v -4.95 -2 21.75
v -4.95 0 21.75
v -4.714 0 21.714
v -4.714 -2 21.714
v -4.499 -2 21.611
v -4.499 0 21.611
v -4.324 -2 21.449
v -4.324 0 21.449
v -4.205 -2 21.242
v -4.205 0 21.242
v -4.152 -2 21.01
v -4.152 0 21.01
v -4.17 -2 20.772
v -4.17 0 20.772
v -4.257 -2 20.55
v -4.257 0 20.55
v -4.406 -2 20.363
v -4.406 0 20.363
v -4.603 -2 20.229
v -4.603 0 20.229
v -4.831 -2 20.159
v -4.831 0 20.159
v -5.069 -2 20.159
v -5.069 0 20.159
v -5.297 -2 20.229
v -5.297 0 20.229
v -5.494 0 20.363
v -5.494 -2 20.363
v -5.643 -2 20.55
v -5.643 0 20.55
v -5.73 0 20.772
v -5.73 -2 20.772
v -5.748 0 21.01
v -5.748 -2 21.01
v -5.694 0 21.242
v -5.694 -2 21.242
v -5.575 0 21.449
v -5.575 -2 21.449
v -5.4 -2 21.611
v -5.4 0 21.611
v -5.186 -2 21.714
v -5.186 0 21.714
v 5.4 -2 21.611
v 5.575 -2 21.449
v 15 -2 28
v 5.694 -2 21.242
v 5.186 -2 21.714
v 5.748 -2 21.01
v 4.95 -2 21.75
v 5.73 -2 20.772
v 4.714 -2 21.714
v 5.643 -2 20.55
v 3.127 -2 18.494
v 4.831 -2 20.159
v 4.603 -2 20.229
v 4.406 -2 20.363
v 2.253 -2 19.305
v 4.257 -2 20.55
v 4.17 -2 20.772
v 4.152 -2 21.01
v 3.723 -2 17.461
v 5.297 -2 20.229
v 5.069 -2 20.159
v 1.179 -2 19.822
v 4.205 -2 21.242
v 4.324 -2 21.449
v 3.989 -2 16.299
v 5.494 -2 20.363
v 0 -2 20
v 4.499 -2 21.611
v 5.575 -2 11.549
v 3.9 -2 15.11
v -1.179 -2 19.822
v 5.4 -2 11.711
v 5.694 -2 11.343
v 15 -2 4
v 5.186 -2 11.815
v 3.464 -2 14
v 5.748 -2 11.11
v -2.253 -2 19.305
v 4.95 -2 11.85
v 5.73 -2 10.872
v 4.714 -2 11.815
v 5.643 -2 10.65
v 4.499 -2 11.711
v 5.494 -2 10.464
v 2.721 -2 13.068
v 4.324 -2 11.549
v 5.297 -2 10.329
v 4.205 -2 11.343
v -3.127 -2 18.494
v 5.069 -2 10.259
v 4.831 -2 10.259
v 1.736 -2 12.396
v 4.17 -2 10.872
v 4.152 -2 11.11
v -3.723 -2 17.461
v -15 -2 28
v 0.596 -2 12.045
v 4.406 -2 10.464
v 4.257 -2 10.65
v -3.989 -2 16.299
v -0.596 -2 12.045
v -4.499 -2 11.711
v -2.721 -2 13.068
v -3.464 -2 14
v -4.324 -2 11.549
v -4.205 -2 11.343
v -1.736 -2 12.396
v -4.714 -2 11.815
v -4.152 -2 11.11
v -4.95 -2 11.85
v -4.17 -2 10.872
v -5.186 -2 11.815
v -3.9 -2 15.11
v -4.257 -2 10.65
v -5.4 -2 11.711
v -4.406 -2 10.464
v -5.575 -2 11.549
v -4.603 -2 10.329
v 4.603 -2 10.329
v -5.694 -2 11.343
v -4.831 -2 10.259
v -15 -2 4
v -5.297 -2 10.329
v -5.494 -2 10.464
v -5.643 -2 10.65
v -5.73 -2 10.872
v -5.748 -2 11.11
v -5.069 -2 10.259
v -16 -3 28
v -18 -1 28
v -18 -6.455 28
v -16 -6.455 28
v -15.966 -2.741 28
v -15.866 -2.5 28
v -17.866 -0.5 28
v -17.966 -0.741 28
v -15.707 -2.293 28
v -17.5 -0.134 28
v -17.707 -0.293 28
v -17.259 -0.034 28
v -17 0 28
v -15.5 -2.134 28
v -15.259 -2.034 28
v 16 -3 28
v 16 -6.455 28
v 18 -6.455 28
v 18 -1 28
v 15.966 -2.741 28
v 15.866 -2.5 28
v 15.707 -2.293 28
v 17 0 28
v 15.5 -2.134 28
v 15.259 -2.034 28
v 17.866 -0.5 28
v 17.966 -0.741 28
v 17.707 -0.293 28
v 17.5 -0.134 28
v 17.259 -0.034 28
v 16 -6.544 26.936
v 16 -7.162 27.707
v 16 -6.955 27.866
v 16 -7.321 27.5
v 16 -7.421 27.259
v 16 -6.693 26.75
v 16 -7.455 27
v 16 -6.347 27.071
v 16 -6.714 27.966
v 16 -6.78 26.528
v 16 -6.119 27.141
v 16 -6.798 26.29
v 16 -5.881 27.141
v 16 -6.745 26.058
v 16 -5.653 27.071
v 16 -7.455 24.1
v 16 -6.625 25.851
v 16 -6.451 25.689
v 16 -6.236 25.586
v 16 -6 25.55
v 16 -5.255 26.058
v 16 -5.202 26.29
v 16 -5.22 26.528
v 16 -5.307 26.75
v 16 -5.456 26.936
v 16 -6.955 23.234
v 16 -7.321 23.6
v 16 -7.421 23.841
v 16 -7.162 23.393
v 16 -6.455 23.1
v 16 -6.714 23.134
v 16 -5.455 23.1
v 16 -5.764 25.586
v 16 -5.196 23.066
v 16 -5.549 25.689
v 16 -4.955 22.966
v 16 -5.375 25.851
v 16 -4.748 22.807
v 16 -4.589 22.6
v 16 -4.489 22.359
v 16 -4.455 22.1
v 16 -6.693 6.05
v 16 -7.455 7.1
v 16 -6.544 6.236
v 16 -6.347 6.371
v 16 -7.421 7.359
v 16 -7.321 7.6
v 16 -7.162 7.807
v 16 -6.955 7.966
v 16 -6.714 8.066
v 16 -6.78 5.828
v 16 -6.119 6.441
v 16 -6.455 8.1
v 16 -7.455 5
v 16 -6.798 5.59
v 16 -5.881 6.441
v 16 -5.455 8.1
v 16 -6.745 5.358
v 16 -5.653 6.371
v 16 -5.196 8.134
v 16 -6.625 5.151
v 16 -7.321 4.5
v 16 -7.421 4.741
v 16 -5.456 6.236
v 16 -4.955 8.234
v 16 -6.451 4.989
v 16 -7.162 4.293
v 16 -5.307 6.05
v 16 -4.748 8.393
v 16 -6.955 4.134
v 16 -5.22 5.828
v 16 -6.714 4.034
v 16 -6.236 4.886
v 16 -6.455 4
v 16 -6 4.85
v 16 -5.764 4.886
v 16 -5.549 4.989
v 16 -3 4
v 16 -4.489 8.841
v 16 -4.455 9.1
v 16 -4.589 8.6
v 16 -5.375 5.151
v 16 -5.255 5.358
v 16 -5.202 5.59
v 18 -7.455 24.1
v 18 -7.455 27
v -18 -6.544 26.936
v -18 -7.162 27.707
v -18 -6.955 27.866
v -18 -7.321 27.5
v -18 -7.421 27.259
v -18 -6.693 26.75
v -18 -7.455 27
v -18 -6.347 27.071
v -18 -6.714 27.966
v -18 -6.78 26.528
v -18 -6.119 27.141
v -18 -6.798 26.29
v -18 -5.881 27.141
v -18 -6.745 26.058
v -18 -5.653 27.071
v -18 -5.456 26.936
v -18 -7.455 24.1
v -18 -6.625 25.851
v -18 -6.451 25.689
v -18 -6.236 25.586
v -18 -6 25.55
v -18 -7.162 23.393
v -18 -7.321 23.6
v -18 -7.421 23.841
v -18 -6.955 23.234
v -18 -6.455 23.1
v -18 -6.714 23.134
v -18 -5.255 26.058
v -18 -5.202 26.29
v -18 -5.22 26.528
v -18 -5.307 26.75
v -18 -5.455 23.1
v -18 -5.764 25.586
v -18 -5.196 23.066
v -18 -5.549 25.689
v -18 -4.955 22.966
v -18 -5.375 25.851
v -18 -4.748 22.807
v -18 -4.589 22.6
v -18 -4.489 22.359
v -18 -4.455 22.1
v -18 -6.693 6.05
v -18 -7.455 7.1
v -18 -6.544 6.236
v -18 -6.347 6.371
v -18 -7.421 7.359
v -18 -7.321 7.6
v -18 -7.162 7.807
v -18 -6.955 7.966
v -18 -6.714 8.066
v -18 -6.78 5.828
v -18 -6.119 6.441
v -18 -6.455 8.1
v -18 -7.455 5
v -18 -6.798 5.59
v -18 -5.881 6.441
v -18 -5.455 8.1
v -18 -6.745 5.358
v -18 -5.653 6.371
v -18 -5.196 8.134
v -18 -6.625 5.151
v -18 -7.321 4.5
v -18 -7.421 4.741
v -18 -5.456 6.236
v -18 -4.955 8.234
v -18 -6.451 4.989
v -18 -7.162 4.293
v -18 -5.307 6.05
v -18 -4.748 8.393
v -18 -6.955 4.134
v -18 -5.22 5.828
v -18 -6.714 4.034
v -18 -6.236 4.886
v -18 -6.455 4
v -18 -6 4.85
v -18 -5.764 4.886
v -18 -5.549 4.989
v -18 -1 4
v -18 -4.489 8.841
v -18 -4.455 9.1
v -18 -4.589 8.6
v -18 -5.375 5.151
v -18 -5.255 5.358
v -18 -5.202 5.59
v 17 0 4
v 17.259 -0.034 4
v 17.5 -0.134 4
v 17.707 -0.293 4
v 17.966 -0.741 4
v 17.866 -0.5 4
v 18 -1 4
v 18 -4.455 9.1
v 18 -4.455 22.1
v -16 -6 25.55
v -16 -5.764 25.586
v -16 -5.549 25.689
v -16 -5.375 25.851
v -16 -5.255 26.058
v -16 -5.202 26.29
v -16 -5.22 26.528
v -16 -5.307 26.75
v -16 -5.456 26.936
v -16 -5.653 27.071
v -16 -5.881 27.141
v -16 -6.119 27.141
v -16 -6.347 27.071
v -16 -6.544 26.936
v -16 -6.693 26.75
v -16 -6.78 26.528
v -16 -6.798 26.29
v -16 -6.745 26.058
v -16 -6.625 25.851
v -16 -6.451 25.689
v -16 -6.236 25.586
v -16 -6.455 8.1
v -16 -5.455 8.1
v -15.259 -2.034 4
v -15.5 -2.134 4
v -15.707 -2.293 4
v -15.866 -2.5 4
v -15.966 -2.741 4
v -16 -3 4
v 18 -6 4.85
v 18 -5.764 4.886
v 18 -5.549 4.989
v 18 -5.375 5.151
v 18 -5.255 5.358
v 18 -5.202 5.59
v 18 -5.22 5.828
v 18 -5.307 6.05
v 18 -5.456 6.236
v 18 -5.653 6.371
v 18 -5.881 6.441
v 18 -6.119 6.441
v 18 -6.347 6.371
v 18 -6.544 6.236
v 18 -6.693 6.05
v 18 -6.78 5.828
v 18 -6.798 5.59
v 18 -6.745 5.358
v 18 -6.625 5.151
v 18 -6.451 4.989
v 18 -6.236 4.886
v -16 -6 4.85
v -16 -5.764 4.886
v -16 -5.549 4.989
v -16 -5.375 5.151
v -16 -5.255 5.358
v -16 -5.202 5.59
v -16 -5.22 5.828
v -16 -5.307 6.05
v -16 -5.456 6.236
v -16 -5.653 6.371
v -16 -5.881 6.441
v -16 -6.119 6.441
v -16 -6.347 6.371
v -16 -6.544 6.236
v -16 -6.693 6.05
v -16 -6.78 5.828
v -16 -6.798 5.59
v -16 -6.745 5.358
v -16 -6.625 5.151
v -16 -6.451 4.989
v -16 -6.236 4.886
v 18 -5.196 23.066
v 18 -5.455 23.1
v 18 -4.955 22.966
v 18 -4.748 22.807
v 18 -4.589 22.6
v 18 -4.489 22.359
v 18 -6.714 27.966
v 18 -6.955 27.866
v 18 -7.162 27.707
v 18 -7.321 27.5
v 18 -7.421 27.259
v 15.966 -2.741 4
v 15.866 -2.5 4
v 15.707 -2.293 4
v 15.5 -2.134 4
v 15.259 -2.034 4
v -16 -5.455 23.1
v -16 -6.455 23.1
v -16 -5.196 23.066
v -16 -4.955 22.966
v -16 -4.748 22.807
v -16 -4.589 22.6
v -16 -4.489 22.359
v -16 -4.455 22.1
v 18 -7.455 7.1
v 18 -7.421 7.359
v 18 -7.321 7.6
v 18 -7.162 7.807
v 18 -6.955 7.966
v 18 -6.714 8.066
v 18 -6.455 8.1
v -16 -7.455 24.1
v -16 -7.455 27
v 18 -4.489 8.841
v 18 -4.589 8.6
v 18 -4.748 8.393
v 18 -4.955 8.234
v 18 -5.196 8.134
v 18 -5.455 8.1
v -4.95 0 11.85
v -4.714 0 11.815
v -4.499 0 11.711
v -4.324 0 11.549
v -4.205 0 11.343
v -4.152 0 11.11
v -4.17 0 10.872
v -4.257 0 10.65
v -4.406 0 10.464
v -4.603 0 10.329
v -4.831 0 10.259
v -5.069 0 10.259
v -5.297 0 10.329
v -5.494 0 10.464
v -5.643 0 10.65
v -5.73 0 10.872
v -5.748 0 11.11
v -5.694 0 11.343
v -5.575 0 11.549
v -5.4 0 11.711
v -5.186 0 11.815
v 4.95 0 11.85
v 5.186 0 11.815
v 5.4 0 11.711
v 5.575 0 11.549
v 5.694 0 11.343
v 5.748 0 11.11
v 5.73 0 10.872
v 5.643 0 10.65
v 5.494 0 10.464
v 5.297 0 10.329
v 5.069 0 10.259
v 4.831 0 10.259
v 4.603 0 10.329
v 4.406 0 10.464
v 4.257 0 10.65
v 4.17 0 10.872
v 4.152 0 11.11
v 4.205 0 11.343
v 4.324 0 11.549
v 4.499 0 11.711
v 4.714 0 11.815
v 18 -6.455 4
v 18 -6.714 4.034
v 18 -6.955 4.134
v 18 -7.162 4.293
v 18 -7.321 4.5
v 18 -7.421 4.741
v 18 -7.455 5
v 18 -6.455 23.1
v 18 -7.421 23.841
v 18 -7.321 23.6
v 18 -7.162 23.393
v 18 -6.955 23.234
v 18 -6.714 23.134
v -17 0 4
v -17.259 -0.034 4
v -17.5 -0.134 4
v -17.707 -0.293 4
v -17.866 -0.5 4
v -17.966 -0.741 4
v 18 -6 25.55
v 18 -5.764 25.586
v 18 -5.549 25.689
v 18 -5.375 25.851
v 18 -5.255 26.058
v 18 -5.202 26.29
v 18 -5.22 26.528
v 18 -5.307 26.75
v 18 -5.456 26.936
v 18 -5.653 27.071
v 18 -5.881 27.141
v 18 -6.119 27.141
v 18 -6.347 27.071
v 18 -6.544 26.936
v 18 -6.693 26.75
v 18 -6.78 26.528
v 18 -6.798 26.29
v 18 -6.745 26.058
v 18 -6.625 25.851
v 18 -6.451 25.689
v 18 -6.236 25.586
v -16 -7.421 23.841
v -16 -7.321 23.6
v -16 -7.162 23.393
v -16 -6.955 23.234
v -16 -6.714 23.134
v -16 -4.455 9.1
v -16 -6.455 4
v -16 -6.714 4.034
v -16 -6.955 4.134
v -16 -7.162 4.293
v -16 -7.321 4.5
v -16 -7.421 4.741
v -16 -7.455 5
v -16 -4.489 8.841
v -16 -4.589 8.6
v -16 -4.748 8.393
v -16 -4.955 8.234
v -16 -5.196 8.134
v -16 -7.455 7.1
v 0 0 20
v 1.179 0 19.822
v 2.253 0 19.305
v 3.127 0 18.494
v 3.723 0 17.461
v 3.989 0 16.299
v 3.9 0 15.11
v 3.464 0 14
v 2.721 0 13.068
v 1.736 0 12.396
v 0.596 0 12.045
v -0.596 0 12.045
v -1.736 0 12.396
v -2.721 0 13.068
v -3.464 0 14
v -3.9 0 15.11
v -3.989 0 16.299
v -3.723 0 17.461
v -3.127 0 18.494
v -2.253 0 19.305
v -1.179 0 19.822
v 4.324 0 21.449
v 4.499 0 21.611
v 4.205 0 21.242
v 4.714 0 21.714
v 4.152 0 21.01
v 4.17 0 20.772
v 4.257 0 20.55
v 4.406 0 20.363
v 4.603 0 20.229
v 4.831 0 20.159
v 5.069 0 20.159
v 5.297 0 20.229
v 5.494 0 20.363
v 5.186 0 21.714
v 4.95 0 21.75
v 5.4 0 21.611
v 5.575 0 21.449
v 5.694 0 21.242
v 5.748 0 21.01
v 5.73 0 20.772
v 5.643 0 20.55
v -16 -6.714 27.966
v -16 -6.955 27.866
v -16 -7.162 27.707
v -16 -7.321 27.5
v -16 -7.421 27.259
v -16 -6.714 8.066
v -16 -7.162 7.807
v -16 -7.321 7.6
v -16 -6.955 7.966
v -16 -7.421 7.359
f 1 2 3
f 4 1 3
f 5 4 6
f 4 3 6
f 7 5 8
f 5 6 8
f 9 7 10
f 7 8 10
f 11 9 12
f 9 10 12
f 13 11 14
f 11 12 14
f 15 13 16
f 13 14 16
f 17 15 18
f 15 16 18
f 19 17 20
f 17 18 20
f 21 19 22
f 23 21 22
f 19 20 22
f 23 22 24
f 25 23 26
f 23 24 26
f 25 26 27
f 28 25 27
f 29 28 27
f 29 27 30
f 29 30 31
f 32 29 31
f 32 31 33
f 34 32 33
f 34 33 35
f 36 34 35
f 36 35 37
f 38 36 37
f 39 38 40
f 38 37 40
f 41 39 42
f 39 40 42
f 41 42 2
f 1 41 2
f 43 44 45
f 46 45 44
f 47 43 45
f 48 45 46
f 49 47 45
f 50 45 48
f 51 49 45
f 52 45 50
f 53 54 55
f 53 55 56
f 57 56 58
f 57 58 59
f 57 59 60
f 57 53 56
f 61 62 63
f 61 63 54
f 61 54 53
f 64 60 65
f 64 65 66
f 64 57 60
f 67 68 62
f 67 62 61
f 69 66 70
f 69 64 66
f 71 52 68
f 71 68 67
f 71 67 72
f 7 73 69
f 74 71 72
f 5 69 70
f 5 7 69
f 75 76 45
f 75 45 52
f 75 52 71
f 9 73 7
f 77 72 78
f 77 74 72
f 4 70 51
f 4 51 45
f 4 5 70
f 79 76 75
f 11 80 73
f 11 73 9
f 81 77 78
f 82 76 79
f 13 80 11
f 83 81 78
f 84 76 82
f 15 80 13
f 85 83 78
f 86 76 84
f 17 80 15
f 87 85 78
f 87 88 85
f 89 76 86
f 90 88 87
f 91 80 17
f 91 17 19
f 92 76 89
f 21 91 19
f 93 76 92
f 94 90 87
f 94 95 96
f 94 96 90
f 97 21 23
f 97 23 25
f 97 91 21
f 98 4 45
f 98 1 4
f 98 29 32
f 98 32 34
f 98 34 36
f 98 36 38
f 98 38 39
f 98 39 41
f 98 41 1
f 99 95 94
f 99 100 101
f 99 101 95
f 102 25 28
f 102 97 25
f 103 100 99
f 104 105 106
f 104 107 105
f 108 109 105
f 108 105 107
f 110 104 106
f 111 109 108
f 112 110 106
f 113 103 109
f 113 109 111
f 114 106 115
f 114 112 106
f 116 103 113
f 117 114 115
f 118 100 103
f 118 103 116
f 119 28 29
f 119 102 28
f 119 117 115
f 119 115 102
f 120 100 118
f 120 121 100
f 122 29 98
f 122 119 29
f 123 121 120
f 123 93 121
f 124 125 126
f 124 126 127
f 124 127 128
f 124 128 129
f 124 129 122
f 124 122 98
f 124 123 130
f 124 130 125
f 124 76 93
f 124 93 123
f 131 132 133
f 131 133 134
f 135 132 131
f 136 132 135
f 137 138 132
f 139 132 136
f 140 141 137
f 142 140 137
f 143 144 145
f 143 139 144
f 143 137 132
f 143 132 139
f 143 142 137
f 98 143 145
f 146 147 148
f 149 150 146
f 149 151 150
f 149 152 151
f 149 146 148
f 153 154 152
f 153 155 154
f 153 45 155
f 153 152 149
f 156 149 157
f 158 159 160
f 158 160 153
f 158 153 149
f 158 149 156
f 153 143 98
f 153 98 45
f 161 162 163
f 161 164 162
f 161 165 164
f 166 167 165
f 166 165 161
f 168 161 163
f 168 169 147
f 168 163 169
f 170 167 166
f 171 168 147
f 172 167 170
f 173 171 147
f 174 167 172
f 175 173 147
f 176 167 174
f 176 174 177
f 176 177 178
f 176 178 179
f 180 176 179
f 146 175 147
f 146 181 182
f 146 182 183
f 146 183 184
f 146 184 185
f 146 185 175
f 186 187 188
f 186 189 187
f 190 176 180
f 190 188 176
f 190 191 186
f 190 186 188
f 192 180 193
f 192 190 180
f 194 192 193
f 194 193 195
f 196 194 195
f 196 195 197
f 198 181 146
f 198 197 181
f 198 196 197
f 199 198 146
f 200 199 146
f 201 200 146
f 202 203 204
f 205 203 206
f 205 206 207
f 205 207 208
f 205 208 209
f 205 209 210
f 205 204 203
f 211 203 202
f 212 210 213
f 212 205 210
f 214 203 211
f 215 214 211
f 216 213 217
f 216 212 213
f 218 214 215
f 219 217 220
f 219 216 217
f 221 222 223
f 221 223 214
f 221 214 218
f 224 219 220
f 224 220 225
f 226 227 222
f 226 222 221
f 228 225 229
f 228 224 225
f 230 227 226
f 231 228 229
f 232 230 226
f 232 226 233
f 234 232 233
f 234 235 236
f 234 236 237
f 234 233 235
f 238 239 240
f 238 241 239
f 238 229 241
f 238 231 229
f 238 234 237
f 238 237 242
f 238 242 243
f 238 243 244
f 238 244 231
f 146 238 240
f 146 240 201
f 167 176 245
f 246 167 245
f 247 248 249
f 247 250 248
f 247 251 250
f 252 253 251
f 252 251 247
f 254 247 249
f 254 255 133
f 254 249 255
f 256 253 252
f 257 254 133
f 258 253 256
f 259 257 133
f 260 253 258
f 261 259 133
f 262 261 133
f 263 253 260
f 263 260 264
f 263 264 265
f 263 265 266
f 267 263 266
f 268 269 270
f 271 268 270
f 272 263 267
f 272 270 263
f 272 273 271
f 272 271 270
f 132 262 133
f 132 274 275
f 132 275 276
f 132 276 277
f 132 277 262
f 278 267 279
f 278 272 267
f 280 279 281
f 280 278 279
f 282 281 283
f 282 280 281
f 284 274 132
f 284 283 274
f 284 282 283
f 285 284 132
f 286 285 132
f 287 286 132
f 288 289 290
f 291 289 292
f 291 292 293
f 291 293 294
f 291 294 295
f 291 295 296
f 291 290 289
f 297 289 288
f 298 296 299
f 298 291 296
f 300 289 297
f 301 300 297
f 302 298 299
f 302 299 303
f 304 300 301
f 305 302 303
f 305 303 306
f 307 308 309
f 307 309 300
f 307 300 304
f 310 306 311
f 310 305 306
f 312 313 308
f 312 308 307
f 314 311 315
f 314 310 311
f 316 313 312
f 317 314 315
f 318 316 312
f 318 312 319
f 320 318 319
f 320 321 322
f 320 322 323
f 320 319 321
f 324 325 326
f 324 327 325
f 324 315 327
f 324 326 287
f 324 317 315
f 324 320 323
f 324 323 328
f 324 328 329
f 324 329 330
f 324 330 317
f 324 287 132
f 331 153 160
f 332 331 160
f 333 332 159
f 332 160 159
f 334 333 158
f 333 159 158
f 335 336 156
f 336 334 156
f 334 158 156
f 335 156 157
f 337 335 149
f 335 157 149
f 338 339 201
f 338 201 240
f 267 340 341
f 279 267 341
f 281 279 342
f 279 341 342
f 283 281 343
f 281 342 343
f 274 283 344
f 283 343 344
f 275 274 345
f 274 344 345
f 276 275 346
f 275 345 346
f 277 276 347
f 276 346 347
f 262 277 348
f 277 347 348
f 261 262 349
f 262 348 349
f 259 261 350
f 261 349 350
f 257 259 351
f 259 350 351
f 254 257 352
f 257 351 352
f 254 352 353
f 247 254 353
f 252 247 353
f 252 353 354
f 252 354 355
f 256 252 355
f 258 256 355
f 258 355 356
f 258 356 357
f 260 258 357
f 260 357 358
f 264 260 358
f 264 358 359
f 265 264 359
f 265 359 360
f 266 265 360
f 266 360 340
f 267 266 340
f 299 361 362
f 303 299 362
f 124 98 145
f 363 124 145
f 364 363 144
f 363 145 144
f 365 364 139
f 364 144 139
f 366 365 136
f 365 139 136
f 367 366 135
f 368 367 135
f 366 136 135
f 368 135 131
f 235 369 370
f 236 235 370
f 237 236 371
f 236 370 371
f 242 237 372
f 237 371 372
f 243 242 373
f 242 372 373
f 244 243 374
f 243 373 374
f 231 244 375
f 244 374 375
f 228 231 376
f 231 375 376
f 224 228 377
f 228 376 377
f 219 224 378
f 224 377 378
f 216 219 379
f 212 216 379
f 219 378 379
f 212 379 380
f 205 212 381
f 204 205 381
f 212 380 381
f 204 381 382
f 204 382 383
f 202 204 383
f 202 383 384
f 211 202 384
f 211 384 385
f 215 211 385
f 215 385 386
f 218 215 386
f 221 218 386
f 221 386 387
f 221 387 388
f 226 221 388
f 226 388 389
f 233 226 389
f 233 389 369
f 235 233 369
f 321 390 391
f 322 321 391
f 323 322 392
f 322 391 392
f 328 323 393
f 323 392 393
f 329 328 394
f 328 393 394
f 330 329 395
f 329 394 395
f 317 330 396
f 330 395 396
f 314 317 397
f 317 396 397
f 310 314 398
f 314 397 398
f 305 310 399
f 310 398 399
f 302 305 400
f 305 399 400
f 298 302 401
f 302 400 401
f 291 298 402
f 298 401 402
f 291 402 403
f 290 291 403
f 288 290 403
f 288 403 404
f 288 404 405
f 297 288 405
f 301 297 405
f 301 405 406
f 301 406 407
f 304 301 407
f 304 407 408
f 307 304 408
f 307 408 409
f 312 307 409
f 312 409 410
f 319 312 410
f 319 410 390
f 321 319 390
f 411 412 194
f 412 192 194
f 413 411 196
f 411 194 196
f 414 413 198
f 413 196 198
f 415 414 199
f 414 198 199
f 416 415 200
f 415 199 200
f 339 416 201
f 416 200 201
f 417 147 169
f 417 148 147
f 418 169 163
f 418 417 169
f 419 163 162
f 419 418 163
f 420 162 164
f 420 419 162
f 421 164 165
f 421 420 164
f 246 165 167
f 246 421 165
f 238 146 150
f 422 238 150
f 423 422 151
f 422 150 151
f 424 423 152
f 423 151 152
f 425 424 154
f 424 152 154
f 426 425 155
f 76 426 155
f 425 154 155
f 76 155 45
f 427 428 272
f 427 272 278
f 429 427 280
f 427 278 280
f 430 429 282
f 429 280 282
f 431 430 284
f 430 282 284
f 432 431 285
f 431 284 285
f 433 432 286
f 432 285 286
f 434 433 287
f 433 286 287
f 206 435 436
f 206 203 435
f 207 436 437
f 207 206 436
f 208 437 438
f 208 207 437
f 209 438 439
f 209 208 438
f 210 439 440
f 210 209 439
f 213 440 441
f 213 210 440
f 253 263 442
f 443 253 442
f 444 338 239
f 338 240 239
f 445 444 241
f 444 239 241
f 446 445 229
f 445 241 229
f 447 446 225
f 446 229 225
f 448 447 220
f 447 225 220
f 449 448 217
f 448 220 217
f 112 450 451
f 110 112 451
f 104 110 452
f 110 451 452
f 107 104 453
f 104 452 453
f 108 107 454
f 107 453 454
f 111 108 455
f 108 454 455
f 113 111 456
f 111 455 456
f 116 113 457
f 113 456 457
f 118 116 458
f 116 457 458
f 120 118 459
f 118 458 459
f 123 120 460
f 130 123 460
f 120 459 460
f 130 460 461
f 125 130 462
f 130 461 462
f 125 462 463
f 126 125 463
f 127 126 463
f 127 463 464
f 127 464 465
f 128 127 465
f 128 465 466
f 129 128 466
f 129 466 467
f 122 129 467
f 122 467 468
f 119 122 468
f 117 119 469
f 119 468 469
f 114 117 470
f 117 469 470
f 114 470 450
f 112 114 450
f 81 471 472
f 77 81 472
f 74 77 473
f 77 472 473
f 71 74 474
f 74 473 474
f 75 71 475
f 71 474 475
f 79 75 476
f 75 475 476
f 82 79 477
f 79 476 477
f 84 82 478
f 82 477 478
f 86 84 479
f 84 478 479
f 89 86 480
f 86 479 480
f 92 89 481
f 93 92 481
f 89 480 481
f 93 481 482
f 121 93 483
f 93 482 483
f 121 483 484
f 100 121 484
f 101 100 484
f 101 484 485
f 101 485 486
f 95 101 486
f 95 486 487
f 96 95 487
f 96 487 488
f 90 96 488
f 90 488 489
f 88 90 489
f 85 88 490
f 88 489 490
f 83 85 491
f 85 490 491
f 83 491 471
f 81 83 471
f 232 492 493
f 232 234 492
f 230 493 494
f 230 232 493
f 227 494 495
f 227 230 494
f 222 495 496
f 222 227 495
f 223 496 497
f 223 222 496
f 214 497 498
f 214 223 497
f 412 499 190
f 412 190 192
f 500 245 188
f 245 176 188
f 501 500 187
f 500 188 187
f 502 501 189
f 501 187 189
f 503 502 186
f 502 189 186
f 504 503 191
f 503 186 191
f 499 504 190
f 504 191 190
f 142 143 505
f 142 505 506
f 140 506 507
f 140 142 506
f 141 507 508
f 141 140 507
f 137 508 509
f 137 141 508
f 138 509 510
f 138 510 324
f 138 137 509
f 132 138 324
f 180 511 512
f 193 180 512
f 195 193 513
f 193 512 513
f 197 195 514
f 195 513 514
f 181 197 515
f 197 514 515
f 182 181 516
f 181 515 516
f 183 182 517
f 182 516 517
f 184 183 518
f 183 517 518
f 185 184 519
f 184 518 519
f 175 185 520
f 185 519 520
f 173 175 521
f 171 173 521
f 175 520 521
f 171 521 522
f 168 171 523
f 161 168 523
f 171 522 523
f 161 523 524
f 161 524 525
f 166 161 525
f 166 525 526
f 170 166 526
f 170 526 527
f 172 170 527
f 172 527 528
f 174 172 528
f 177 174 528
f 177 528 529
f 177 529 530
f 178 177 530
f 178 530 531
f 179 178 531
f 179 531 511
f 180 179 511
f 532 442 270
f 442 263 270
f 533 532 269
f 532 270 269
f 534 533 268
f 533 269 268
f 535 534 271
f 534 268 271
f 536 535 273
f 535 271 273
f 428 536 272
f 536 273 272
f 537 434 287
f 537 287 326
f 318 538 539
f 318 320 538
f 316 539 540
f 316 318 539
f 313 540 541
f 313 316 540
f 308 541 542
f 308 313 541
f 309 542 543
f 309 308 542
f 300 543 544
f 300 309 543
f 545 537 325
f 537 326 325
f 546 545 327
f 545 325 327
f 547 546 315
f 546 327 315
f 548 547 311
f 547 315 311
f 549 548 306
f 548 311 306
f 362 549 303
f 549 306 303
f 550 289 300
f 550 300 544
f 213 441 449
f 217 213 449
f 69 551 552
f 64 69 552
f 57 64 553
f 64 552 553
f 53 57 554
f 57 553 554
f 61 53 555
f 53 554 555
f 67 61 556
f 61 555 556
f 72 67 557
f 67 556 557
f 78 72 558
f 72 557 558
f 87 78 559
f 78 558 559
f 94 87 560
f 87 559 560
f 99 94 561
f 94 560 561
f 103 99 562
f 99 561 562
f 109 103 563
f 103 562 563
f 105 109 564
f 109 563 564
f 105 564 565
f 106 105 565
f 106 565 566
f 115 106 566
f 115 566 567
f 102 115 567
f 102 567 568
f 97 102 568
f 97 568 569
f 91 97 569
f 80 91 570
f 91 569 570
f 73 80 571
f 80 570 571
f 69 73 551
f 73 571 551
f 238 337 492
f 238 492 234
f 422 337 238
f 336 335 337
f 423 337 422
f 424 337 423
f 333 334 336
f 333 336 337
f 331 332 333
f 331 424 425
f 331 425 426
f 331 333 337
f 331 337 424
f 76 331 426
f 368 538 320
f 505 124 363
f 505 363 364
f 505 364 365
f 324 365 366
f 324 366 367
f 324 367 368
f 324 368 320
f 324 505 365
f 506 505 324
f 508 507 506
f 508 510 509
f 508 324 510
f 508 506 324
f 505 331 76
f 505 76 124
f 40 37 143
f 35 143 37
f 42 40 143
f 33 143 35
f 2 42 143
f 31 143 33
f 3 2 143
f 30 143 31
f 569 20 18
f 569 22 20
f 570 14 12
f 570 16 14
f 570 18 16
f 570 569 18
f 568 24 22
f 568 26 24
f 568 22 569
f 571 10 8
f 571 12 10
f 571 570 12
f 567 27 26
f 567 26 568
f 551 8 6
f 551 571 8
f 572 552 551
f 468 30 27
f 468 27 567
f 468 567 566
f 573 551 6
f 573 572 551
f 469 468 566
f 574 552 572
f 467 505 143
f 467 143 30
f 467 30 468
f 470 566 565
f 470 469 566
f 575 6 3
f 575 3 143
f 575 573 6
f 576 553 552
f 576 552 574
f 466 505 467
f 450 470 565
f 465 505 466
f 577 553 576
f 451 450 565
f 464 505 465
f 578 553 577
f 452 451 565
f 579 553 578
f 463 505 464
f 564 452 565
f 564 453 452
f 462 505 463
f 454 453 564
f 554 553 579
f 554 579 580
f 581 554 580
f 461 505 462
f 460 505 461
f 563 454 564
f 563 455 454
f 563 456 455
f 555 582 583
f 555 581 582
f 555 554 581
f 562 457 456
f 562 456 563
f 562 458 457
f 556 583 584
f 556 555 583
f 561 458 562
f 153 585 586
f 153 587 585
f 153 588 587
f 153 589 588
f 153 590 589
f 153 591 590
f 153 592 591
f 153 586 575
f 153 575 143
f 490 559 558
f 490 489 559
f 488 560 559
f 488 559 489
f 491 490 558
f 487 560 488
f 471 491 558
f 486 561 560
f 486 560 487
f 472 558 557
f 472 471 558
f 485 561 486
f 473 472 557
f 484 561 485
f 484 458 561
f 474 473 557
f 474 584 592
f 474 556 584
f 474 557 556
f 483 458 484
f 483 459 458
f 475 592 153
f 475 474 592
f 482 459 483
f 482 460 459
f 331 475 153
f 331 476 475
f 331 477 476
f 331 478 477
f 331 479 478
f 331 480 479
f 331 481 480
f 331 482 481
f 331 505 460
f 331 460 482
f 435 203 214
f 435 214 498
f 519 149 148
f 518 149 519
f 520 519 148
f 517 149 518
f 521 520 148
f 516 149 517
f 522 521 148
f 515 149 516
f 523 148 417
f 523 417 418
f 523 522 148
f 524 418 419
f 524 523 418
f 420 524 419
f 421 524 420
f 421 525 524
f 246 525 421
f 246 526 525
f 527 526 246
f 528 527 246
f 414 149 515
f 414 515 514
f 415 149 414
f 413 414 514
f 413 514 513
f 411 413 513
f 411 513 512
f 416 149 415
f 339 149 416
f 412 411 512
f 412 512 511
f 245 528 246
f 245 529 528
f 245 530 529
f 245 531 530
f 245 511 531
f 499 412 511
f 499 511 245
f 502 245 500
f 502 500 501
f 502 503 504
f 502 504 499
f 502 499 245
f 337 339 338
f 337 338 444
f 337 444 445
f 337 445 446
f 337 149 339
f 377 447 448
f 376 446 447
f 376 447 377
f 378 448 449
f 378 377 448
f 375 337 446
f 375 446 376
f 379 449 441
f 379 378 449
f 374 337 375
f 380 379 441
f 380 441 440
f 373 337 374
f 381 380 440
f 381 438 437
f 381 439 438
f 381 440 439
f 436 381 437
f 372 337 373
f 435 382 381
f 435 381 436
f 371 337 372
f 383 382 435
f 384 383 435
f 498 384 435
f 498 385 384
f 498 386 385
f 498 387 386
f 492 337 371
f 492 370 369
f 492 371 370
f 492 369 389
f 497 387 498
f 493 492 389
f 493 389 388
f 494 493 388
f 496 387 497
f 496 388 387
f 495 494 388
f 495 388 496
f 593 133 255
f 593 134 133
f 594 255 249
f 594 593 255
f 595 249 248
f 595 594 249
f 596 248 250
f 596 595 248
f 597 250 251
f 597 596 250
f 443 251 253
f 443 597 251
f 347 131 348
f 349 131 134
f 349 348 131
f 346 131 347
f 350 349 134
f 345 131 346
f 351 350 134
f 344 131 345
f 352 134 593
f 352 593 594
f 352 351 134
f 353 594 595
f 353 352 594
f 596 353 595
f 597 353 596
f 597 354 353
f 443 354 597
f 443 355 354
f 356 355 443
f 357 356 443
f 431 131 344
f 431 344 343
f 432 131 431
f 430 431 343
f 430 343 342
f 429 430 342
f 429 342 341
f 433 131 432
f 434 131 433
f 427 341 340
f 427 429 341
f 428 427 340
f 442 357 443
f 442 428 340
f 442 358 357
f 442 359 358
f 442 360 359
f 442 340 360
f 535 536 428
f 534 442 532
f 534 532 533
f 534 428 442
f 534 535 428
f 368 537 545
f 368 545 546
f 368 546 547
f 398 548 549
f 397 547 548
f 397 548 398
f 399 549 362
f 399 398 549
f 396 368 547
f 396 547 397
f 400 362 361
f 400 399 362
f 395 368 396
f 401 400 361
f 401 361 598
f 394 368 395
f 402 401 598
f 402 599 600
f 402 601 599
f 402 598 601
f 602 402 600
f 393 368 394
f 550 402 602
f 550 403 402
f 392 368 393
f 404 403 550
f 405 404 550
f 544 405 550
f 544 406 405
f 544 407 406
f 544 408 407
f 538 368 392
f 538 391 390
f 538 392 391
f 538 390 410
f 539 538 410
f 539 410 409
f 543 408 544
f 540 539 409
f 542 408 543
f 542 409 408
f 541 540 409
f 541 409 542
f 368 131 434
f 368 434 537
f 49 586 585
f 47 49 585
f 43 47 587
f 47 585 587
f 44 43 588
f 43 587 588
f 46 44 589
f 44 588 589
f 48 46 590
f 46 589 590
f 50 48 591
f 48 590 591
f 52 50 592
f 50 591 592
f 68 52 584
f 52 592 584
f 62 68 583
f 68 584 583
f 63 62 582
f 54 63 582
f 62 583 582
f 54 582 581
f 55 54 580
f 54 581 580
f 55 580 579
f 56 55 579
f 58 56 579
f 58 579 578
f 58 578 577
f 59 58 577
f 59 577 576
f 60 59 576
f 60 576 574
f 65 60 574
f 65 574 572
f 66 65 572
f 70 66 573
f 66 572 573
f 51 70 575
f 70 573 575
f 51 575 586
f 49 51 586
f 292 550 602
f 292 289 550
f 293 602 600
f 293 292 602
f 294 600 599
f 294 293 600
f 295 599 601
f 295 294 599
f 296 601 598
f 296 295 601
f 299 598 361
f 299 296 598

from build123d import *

# Parameters (mm, degrees)
EXTRUDE_1_DEPTH     = 32
FILLET_1_R          = 1
SKETCH_2_R          = 0.8
CUT_EXTRUDE_1_DEPTH = 50.085647116
SKETCH_3_W          = 43.847258393
SKETCH_3_H          = 18.19729806
CUT_EXTRUDE_2_DEPTH = 4
SKETCH_4_W          = 47.825059727
SKETCH_4_H          = 17.237139118
CUT_EXTRUDE_3_DEPTH = 4
SKETCH_5_W          = 40.336284727
SKETCH_5_H          = 27.150302887
CUT_EXTRUDE_4_DEPTH = 2
SKETCH_6_W          = 15
SKETCH_6_H          = 3
CUT_EXTRUDE_5_DEPTH = 47.212335629
FILLET_2_R          = 1
SKETCH_7_R          = 4
SKETCH_7_R_2        = 0.8
CUT_EXTRUDE_6_DEPTH = 2


with BuildPart() as part:
    # 草图1 → 凸台-拉伸1 (new body)
    with BuildSketch(Plane.XY):
        Polygon((-18, 0), (18, 0), (18, -9.455197133), (16, -9.455197133), (16, -2), (-16, -2), (-16, -8.573476703), (-18, -8.573476703), align=None)
    extrude(amount=EXTRUDE_1_DEPTH)

    # 圆角1
    fillet_1_edges = [part.edges().sort_by_distance(p)[0] for p in [
        (-18, 0, 16),
        (18, 0, 16),
        (16, -2, 16),
        (-16, -2, 16),
    ]]
    fillet(fillet_1_edges, radius=FILLET_1_R)

    # 草图2 → 切除-拉伸1 (cut, through all)
    with BuildSketch(Plane(origin=(18, 0, 0), x_dir=(0, 0, -1), z_dir=(1, 0, 0))):
        with Locations((-26.35, -6)):
            Circle(SKETCH_2_R)
        with Locations((-5.65, -6)):
            Circle(SKETCH_2_R)
    extrude(amount=-CUT_EXTRUDE_1_DEPTH, mode=Mode.SUBTRACT)

    # 草图3 → 切除-拉伸2 (cut)
    with BuildSketch(Plane.XY.offset(32)):
        with Locations((-0.045721854, -4.064631677)):
            Rectangle(SKETCH_3_W, SKETCH_3_H)
    extrude(amount=-CUT_EXTRUDE_2_DEPTH, mode=Mode.SUBTRACT)

    # 草图4 → 切除-拉伸3 (cut)
    with BuildSketch(Plane(origin=(0, 0, 0), x_dir=(-1, 0, 0), z_dir=(0, 0, -1))):
        with Locations((0.800132453, -3.310221079)):
            Rectangle(SKETCH_4_W, SKETCH_4_H)
    extrude(amount=-CUT_EXTRUDE_3_DEPTH, mode=Mode.SUBTRACT)

    # 草图5 → 切除-拉伸4 (cut)
    with BuildSketch(Plane.XZ.offset(9.455197133)):
        with Locations((0.686769888, 16.04578466)):
            Rectangle(SKETCH_5_W, SKETCH_5_H)
    extrude(amount=-CUT_EXTRUDE_4_DEPTH, mode=Mode.SUBTRACT)

    # 草图6 → 切除-拉伸5 (cut, through all)
    with BuildSketch(Plane(origin=(18, 0, 0), x_dir=(0, 0, -1), z_dir=(1, 0, 0))):
        with Locations((-15.6, -5.955197133)):
            Rectangle(SKETCH_6_W, SKETCH_6_H)
    extrude(amount=-CUT_EXTRUDE_5_DEPTH, mode=Mode.SUBTRACT)

    # 圆角2
    fillet_2_edges = [part.edges().sort_by_distance(p)[0] for p in [
        (-17, -7.455197133, 4),
        (17, -7.455197133, 4),
        (17, -7.455197133, 28),
        (-17, -7.455197133, 28),
        (17, -7.455197133, 8.1),
        (17, -7.455197133, 23.1),
        (-17, -4.455197133, 23.1),
        (17, -4.455197133, 23.1),
        (-17, -7.455197133, 8.1),
        (-17, -7.455197133, 23.1),
        (-17, -4.455197133, 8.1),
        (17, -4.455197133, 8.1),
    ]]
    fillet(fillet_2_edges, radius=FILLET_2_R)

    # 草图7 → 切除-拉伸6 (cut)
    with BuildSketch(Plane(origin=(0, 0, 0), x_dir=(1, 0, 0), z_dir=(0, 1, 0))):
        with Locations(Location((0, -16, 0), (0, 0, 270))):
            Circle(SKETCH_7_R)
        with Locations(Location((4.949747468, -11.050252532, 0), (0, 0, 270))):
            Circle(SKETCH_7_R_2)
        with Locations(Location((4.949747468, -20.949747468, 0), (0, 0, 270))):
            Circle(SKETCH_7_R_2)
        with Locations(Location((-4.949747468, -20.949747468, 0), (0, 0, 270))):
            Circle(SKETCH_7_R_2)
        with Locations(Location((-4.949747468, -11.050252532, 0), (0, 0, 270))):
            Circle(SKETCH_7_R_2)
    extrude(amount=-CUT_EXTRUDE_6_DEPTH, mode=Mode.SUBTRACT)


solid = part.part
